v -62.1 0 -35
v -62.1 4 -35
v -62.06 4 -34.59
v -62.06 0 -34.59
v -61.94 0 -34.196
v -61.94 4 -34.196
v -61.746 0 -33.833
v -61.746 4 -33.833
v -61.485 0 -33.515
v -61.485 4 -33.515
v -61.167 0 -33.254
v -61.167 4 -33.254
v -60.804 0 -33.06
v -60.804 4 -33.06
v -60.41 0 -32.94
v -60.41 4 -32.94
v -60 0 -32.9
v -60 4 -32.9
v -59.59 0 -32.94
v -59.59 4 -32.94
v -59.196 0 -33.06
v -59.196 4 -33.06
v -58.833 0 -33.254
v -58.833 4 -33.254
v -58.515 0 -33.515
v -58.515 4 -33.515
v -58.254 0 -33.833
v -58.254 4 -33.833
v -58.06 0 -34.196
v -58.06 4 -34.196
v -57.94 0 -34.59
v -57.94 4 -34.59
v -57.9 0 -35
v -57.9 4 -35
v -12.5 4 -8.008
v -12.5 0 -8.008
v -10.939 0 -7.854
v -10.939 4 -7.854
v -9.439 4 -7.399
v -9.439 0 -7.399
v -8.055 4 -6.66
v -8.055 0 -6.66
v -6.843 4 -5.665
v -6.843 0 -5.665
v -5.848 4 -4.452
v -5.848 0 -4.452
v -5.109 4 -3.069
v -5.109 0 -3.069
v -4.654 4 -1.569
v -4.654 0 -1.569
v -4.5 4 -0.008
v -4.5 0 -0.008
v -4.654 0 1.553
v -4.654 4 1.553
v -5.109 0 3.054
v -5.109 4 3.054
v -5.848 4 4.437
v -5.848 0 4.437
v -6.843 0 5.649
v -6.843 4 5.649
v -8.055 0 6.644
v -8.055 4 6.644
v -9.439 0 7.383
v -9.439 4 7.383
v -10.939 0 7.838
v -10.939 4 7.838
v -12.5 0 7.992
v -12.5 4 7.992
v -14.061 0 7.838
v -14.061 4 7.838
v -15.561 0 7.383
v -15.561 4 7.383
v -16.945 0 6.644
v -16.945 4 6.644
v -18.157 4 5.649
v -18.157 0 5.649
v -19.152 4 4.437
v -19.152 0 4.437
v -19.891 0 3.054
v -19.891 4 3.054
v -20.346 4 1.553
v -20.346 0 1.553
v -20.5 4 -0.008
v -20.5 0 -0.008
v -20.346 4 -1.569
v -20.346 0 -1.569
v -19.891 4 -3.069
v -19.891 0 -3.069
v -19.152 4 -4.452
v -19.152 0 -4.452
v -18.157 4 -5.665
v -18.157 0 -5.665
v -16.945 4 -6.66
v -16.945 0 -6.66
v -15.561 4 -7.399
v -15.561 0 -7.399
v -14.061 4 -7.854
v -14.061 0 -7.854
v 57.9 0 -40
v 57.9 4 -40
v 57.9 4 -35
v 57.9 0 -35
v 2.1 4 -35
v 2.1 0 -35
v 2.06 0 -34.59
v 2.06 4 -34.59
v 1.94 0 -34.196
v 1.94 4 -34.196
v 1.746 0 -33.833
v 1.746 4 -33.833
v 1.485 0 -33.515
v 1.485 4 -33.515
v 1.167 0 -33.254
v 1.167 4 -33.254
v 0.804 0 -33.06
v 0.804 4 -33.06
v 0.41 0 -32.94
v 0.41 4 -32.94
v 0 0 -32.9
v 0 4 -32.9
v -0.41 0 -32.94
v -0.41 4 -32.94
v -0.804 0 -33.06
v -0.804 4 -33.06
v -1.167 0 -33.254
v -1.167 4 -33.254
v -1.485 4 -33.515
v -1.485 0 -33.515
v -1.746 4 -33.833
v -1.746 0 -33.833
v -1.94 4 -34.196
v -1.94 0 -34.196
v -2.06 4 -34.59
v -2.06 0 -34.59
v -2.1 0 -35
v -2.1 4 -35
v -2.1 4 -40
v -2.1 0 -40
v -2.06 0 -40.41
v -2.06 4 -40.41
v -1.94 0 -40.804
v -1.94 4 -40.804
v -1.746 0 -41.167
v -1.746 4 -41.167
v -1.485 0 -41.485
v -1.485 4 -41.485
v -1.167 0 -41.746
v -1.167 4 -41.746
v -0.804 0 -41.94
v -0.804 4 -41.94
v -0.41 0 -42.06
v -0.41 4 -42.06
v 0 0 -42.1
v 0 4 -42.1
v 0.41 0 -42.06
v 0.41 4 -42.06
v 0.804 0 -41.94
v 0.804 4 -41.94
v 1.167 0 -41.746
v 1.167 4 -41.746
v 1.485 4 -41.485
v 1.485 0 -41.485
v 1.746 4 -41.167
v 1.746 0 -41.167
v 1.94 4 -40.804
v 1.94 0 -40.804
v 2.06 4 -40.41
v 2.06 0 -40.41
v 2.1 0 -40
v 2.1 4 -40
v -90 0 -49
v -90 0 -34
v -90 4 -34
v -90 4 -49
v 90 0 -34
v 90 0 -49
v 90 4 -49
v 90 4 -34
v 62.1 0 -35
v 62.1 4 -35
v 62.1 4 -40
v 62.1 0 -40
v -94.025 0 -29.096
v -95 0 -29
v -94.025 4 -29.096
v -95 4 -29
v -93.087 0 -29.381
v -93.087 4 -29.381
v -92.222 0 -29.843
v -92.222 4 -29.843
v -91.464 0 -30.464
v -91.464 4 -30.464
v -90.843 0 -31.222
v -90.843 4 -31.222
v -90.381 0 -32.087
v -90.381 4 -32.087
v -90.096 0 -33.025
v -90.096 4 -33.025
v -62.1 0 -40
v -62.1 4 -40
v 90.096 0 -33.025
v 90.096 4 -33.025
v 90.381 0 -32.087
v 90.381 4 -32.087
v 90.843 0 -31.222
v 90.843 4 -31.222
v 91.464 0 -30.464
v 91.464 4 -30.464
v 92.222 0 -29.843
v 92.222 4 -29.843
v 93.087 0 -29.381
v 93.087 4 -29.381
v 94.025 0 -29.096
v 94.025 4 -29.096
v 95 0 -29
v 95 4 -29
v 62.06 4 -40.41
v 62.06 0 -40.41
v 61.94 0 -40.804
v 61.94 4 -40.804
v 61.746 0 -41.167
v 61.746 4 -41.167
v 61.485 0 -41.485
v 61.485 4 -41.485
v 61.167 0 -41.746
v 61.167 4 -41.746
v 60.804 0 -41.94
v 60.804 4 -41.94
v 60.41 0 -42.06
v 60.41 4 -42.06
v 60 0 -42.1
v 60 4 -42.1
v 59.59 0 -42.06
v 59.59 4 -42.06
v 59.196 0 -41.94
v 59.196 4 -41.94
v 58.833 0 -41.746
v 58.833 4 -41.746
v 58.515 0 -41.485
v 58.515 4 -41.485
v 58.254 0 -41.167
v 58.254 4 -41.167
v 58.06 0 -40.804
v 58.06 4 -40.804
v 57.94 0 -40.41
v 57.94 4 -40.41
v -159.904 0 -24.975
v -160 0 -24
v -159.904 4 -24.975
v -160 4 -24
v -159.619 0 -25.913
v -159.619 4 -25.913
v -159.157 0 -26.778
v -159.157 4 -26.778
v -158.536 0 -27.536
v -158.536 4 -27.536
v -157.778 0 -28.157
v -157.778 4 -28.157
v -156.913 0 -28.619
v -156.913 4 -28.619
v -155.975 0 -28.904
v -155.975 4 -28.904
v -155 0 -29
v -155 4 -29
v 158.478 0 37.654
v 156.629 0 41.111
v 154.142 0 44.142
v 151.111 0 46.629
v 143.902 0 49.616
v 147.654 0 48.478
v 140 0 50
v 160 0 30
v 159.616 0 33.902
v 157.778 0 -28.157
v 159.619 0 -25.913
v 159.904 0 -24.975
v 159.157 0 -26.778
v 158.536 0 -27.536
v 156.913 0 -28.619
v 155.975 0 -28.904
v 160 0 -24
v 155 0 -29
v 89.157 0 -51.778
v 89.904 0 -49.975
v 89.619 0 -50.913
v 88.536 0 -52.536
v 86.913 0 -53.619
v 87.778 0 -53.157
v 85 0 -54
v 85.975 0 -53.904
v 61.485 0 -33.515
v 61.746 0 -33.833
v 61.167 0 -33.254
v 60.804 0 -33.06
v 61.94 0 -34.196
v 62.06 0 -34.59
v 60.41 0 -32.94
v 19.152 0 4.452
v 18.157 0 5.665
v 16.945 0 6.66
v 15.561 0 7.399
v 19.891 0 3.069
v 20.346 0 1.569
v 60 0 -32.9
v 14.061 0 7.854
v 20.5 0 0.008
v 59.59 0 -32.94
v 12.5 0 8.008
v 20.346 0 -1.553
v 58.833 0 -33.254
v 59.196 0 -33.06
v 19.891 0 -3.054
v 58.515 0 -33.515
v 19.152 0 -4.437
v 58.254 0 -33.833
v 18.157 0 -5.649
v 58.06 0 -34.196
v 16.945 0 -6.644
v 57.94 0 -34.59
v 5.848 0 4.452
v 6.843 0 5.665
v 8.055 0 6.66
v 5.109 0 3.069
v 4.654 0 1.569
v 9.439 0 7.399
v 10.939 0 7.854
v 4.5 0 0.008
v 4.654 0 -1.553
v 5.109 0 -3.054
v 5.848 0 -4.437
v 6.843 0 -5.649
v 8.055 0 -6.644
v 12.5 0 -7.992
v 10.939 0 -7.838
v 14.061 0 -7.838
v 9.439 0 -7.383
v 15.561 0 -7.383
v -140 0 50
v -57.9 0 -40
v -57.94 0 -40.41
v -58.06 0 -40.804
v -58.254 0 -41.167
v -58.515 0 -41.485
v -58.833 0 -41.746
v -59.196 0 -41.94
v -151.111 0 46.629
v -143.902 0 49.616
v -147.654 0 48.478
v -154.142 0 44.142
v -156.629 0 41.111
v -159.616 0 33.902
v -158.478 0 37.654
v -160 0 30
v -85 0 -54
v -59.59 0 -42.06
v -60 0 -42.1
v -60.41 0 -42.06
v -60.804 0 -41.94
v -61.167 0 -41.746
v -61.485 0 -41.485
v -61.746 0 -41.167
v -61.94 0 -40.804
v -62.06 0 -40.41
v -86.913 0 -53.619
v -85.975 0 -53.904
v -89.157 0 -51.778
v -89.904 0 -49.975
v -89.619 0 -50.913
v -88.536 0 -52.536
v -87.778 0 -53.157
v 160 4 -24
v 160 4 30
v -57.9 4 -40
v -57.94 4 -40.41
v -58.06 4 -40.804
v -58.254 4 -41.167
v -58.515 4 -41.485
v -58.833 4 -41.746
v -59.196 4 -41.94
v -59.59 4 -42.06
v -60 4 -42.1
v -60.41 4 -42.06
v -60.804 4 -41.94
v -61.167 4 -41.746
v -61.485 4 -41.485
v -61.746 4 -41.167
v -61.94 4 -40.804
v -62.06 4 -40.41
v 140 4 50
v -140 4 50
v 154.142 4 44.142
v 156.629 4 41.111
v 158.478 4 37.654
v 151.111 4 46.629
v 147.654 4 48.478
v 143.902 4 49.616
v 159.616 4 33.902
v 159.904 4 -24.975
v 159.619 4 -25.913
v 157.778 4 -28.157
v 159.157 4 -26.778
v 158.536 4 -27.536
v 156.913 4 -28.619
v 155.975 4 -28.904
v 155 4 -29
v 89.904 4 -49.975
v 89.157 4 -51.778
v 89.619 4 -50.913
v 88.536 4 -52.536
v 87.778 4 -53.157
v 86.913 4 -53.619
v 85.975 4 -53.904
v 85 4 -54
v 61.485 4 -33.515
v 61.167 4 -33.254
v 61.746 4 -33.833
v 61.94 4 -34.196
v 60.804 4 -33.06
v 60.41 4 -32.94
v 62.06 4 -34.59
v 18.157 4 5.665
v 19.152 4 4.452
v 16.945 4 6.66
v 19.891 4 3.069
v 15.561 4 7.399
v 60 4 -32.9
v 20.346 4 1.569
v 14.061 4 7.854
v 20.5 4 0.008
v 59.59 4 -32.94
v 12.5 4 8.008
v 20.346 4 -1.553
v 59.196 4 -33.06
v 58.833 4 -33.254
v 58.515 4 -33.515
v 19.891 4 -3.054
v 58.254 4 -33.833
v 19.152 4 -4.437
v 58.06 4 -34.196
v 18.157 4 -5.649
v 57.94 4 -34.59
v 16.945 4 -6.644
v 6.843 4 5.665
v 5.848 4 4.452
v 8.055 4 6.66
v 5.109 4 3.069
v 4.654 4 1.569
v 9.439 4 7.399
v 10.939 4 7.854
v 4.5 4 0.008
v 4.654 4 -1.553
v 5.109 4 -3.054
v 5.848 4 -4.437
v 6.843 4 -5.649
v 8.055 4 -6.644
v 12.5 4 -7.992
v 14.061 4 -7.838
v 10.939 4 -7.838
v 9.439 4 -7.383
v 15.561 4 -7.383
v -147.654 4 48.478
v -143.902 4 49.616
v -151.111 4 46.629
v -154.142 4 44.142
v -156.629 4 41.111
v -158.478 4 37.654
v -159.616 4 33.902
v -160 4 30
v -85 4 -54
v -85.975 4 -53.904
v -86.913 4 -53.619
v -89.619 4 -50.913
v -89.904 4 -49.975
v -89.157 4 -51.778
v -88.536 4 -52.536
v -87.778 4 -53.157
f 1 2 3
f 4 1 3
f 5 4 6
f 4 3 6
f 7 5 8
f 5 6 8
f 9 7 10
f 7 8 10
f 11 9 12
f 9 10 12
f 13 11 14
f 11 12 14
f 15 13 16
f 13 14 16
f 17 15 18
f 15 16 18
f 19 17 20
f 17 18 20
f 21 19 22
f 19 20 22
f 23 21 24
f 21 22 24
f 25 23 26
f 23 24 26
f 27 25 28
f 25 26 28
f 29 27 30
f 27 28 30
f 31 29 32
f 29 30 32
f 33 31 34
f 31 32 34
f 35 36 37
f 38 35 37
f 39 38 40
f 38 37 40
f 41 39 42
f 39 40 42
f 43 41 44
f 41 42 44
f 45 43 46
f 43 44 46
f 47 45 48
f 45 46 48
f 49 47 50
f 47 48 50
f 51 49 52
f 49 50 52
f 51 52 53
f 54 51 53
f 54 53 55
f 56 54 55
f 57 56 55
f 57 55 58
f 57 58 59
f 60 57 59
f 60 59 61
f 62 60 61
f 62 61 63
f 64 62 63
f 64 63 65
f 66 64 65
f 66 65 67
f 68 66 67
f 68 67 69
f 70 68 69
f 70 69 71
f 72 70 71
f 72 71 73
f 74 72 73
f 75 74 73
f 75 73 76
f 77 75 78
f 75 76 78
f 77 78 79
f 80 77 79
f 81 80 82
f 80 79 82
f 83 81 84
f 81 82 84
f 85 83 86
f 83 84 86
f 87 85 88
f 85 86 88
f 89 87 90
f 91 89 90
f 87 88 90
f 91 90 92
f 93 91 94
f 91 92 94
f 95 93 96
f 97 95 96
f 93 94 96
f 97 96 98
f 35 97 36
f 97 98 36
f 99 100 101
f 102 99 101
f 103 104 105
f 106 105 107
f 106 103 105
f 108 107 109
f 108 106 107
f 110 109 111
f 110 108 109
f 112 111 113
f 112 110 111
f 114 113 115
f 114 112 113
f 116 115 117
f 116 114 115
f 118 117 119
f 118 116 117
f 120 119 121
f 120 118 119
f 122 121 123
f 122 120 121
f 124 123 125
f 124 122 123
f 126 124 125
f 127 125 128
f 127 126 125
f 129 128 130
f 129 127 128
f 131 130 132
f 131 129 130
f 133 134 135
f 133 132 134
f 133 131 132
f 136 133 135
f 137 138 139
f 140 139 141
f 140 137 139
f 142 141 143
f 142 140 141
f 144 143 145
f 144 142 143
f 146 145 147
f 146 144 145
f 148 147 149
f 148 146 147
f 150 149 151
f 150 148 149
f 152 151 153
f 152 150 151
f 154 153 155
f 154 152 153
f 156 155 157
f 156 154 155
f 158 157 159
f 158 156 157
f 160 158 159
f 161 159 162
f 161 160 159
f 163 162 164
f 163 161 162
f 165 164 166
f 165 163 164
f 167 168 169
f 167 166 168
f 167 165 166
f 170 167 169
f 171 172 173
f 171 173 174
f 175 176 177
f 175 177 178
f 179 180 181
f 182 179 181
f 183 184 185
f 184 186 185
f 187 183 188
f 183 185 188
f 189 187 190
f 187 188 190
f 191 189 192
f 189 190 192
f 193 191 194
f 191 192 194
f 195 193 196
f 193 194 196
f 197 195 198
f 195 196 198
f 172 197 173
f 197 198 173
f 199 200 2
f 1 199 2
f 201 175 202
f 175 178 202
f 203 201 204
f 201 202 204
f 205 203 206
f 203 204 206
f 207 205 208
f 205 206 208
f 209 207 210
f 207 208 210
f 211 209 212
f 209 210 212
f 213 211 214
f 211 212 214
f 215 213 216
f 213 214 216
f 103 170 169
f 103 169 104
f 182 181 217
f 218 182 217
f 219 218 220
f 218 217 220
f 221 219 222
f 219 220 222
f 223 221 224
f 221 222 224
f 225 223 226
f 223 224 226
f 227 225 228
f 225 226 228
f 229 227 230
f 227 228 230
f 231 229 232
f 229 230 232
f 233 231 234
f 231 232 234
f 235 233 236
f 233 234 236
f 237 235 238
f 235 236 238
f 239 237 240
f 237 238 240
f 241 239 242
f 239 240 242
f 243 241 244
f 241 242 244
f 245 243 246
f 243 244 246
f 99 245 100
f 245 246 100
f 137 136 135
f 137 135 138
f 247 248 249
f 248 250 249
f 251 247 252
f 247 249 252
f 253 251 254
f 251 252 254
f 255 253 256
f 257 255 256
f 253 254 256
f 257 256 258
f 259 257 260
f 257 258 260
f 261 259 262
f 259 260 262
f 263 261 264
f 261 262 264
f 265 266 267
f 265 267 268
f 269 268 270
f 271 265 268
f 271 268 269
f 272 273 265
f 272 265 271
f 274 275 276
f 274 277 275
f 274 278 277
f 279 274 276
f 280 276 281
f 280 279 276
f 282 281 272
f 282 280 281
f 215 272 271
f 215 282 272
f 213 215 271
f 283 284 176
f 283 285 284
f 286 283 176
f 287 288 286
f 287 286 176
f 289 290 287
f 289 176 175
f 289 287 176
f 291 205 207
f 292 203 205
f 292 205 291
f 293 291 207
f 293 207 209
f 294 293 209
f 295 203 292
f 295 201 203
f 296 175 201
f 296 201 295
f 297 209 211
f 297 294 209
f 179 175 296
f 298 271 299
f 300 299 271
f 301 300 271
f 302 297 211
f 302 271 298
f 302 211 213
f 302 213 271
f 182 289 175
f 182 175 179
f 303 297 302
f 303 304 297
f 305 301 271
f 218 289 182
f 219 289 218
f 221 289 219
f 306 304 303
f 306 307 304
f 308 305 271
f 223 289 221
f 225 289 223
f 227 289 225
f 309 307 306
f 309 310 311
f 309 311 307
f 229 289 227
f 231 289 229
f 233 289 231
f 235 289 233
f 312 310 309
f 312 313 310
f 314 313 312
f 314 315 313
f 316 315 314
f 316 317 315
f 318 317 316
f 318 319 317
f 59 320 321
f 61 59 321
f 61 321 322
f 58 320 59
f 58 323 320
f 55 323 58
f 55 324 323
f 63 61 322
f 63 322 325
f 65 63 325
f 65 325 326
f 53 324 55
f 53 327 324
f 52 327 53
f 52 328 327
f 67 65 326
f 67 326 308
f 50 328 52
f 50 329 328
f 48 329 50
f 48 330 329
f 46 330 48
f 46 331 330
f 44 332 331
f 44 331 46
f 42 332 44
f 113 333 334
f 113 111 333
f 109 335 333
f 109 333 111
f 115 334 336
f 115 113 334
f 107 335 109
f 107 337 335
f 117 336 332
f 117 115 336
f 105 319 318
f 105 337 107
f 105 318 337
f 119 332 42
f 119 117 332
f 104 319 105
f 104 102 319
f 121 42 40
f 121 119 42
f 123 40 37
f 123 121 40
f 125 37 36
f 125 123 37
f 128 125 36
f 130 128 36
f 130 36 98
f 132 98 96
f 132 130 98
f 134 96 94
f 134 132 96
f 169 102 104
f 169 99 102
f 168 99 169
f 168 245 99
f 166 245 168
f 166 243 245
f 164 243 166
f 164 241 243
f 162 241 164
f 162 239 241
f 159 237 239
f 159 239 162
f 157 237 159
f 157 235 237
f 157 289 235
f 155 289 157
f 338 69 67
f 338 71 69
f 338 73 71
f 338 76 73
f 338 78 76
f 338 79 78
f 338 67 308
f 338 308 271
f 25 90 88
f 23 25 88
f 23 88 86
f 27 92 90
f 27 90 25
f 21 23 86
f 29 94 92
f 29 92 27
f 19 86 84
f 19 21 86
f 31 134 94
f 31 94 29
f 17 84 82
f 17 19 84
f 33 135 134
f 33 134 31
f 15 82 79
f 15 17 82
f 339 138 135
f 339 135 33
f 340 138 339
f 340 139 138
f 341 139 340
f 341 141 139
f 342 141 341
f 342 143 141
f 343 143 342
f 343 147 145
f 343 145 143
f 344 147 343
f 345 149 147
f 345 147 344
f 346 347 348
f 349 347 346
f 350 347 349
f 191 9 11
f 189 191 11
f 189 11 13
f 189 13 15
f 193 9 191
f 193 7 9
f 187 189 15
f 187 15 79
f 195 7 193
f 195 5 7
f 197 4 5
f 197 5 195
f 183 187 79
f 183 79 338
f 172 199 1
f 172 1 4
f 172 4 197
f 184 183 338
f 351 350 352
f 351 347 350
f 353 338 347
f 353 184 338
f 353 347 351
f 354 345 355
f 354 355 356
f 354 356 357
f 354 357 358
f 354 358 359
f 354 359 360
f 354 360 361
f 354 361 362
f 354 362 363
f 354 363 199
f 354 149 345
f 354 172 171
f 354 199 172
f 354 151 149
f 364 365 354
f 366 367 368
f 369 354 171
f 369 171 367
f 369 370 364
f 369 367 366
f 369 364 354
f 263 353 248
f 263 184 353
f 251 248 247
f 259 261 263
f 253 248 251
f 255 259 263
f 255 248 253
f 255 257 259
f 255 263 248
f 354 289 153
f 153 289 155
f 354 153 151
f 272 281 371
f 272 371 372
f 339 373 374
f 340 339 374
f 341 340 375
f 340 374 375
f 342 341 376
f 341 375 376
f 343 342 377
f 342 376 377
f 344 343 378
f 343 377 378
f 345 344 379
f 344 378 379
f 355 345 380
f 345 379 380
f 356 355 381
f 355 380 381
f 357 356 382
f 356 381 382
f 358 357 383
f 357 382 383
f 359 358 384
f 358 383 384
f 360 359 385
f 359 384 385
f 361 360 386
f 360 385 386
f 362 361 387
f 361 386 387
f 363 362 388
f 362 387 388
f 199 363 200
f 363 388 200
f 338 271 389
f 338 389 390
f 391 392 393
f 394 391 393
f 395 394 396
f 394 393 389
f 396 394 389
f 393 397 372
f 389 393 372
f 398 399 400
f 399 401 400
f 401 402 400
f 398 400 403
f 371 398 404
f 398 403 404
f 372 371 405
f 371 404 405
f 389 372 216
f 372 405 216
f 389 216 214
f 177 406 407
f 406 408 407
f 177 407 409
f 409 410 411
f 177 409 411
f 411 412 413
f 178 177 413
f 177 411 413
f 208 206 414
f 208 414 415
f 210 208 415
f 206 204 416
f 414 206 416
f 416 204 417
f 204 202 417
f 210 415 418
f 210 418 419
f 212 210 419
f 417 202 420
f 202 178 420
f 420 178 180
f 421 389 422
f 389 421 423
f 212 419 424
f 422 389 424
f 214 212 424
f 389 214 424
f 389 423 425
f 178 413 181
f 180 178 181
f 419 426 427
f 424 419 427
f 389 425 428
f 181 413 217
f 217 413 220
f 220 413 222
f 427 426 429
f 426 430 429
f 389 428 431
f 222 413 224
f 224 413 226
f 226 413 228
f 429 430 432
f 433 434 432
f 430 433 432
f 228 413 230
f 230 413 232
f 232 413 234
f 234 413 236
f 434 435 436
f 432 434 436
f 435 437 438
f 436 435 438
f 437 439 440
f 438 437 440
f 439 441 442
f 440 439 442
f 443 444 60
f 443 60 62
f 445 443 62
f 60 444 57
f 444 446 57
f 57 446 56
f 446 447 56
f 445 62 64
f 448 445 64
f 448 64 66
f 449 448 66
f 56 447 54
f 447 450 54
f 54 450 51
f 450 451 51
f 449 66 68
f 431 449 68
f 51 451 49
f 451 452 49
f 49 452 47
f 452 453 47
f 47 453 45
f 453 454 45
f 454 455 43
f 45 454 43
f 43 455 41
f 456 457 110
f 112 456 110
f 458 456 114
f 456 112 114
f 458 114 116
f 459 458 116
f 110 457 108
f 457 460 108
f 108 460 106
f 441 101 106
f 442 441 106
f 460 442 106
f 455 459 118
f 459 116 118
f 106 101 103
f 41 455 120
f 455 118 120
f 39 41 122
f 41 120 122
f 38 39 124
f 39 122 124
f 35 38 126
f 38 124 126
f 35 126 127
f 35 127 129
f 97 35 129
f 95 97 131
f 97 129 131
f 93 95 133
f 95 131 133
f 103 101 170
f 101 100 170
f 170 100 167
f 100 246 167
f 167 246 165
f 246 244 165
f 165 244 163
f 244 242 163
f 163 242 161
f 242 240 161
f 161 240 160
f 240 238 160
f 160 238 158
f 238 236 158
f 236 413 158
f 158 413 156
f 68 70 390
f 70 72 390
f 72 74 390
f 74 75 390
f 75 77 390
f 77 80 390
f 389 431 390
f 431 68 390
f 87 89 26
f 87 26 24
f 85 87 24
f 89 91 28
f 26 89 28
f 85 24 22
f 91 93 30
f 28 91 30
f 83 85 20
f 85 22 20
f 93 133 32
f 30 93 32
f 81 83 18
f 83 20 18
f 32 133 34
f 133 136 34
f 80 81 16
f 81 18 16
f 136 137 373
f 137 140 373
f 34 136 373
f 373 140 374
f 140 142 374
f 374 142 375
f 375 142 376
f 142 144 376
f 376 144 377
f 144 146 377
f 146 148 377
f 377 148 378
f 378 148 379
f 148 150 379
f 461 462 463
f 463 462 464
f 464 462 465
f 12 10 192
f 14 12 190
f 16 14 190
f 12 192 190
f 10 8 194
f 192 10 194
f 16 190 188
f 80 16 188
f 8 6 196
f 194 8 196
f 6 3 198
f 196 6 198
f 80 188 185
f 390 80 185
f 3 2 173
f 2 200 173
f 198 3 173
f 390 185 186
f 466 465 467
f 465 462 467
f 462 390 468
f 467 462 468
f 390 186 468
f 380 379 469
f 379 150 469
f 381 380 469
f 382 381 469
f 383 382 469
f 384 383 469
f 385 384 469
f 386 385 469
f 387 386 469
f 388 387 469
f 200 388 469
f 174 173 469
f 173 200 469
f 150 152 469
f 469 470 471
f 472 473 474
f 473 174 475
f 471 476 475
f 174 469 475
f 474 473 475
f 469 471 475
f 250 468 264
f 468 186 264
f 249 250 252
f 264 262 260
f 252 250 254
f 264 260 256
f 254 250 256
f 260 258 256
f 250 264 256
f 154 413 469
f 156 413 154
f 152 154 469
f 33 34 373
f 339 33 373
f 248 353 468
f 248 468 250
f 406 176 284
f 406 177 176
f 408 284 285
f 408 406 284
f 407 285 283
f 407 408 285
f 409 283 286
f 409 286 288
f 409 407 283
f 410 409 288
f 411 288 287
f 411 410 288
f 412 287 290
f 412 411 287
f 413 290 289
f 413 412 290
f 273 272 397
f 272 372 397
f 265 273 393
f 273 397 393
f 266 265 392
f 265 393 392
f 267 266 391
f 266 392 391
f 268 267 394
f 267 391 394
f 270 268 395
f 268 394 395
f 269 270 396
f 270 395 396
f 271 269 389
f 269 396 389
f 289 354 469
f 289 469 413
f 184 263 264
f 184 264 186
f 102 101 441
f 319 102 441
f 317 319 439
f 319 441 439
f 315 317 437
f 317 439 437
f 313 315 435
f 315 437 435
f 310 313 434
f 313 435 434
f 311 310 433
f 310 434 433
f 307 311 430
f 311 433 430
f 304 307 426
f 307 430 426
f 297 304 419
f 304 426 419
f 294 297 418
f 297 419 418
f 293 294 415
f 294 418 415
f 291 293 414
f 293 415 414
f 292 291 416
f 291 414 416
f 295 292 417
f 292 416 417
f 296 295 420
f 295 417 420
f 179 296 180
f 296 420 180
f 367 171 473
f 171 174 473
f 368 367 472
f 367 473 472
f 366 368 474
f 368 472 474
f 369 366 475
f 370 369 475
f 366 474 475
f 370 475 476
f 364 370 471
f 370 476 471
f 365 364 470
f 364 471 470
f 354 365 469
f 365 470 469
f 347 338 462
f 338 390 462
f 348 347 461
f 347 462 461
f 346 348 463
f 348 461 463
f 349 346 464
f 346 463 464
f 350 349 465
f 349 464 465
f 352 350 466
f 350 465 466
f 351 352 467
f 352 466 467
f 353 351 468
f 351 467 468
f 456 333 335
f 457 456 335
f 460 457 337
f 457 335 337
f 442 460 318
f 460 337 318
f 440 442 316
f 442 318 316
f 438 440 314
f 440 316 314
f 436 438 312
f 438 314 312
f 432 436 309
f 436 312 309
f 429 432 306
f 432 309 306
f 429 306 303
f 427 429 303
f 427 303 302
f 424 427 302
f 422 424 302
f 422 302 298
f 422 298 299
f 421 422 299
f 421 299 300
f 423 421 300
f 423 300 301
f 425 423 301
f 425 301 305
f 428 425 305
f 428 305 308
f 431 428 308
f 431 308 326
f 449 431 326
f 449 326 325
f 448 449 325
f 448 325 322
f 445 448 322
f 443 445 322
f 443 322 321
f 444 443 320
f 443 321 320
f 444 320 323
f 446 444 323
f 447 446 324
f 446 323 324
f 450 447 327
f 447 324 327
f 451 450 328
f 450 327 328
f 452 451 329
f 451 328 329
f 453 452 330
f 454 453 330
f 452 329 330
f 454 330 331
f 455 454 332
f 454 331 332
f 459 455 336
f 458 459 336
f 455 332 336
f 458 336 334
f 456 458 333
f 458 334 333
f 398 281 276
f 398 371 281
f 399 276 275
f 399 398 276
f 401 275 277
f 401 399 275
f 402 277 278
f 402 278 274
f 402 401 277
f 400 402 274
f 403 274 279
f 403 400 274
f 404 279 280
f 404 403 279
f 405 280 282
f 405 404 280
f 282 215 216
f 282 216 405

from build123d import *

# Parameters (mm, degrees)
EXTRUDE_1_DEPTH     = 4
FILLET_1_R          = 5
FILLET_2_R          = 20
FILLET_3_R          = 5
SKETCH_2_R          = 8
CUT_EXTRUDE_1_DEPTH = 10
CUT_EXTRUDE_2_DEPTH = 10


with BuildPart() as part:
    # 草图1 → 凸台-拉伸1 (new body)
    with BuildSketch(Plane(origin=(0, 0, 0), x_dir=(1, 0, 0), z_dir=(0, 1, 0))):
        Polygon((90, 54), (90, 29), (160, 29), (160, -50), (-160, -50), (-160, 29), (-90, 29), (-90, 54), align=None)
    extrude(amount=EXTRUDE_1_DEPTH)

    # 圆角1
    fillet_1_edges = [part.edges().sort_by_distance(p)[0] for p in [
        (-90, 2, -29),
        (-90, 2, -54),
        (90, 2, -54),
        (90, 2, -29),
    ]]
    fillet(fillet_1_edges, radius=FILLET_1_R)

    # 圆角2
    fillet_2_edges = [part.edges().sort_by_distance(p)[0] for p in [
        (160, 2, 50),
        (-160, 2, 50),
    ]]
    fillet(fillet_2_edges, radius=FILLET_2_R)

    # 圆角3
    fillet_3_edges = [part.edges().sort_by_distance(p)[0] for p in [
        (-160, 2, -29),
        (160, 2, -29),
    ]]
    fillet(fillet_3_edges, radius=FILLET_3_R)

    # 草图2 → 切除-拉伸1 (cut)
    with BuildSketch(Plane.XZ):
        with Locations(Location((12.499997526, 0.007864027, 0), (0, 0, 270))):
            Circle(SKETCH_2_R)
        with Locations(Location((-12.499997526, -0.007864027, 0), (0, 0, 270))):
            Circle(SKETCH_2_R)
    extrude(amount=-CUT_EXTRUDE_1_DEPTH, mode=Mode.SUBTRACT)

    # 草图4 → 切除-拉伸2 (cut)
    with BuildSketch(Plane(origin=(0, 4, 0), x_dir=(1, 0, 0), z_dir=(0, 1, 0))):
        with BuildLine():
            Line((-2.1, 35), (-2.1, 40))
            ThreePointArc((-2.1, 40), (0, 42.1), (2.1, 40))
            Line((2.1, 40), (2.1, 35))
            ThreePointArc((2.1, 35), (0, 32.9), (-2.1, 35))
        make_face()
        with BuildLine():
            Line((62.1, 35), (62.1, 40))
            ThreePointArc((62.1, 40), (60, 42.1), (57.9, 40))
            Line((57.9, 40), (57.9, 35))
            ThreePointArc((57.9, 35), (60, 32.9), (62.1, 35))
        make_face()
        with BuildLine():
            Line((-57.9, 35), (-57.9, 40))
            ThreePointArc((-57.9, 40), (-60, 42.1), (-62.1, 40))
            Line((-62.1, 40), (-62.1, 35))
            ThreePointArc((-62.1, 35), (-60, 32.9), (-57.9, 35))
        make_face()
    extrude(amount=-CUT_EXTRUDE_2_DEPTH, mode=Mode.SUBTRACT)


solid = part.part
